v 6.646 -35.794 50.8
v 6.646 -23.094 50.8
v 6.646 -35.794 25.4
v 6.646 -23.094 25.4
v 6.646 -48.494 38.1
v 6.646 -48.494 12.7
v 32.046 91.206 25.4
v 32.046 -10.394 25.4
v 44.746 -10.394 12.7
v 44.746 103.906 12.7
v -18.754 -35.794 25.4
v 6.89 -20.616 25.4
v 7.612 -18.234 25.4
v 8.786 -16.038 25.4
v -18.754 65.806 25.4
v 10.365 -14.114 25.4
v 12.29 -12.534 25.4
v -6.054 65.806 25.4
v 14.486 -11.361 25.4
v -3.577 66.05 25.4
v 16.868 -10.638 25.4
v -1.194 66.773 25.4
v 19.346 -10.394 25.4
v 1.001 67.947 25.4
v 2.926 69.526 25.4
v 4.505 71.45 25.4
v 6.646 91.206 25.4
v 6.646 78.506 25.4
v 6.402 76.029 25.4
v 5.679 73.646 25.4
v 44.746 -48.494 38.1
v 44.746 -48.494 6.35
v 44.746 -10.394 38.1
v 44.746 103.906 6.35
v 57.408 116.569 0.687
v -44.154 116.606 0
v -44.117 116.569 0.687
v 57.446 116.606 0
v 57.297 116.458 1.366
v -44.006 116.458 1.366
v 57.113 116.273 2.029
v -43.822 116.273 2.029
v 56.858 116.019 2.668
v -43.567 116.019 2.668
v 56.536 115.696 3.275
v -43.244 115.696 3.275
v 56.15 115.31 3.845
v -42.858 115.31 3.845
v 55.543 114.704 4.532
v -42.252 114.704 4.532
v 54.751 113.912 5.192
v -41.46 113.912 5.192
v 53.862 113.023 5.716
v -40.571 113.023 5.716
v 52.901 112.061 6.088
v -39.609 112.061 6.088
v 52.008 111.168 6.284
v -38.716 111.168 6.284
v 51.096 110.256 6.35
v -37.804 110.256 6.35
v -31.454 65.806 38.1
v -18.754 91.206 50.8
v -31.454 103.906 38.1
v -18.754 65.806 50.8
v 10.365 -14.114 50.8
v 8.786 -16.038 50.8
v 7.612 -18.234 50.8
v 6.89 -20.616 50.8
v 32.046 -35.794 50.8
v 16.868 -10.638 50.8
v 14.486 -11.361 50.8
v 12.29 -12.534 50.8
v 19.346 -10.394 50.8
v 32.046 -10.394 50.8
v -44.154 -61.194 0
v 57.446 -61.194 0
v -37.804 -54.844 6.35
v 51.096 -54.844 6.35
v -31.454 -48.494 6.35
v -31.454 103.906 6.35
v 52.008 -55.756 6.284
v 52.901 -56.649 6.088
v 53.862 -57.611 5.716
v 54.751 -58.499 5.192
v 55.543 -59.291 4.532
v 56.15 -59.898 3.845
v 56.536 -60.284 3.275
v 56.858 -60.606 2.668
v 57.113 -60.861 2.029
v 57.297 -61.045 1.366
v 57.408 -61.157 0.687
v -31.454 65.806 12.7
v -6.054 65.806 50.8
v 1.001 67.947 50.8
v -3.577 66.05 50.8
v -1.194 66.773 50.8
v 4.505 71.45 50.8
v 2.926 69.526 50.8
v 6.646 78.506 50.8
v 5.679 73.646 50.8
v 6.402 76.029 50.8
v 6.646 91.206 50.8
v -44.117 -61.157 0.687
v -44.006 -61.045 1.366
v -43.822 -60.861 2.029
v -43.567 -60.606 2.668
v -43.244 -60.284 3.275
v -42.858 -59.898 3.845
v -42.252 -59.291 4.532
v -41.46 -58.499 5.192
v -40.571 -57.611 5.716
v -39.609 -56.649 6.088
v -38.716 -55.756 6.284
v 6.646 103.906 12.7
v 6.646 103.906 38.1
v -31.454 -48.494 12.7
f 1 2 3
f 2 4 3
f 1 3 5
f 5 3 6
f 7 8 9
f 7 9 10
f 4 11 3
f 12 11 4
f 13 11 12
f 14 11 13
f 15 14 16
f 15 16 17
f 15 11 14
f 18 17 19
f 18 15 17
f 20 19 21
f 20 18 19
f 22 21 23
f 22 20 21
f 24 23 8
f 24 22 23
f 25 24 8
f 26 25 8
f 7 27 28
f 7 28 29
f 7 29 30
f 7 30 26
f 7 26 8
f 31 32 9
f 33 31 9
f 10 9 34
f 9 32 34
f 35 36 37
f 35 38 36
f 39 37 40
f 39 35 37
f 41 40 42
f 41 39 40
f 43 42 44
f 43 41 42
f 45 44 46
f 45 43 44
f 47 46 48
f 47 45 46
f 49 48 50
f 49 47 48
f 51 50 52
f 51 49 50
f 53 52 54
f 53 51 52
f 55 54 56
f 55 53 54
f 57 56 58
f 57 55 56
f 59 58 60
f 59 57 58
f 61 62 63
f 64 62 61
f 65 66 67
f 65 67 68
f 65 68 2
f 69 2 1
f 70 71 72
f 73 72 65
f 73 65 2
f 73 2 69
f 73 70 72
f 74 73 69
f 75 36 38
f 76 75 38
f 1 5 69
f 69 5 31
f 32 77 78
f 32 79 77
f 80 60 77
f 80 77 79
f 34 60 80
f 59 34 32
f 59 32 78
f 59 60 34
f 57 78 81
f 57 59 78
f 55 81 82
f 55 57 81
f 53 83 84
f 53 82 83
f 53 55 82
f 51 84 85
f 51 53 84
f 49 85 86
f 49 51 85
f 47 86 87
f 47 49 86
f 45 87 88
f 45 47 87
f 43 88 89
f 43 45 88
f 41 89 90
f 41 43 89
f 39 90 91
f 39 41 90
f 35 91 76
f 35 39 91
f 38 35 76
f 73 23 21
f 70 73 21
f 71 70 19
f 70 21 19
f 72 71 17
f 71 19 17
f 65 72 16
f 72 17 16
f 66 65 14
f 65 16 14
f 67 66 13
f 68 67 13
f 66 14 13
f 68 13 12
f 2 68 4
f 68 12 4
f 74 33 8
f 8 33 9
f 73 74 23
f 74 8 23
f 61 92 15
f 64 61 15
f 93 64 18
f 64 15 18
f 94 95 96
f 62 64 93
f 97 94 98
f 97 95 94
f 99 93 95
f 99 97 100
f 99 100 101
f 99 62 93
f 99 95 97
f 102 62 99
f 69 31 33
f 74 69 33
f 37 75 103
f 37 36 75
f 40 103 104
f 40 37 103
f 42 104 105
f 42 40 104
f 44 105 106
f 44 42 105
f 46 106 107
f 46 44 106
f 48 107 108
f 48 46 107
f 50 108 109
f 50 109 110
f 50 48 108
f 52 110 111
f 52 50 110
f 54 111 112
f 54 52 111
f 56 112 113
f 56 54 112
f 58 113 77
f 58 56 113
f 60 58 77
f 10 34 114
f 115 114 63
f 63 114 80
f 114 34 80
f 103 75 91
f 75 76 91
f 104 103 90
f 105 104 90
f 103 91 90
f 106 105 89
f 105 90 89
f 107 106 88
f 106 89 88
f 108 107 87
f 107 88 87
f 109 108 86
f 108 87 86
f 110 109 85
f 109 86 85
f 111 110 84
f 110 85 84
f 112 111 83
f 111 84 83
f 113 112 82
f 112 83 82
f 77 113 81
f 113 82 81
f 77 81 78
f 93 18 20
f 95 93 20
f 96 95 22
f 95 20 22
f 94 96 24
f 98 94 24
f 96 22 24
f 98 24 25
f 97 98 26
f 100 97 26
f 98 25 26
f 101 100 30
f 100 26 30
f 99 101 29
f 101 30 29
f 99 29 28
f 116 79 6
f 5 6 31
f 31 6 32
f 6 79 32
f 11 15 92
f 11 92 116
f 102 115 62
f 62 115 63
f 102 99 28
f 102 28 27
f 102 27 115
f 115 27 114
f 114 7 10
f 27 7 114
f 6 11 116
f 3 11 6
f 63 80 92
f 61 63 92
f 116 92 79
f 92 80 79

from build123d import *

# Parameters (mm, degrees)
F1_DEPTH = 25.4
F2_DEPTH = 50.8
F0_W     = 101.6
F0_H     = 177.8
F3_DEPTH = 6.35
F4_R     = 6.34999
F5_SIZE  = 12.7
F6_SIZE  = 12.7


# Not quite as in the source:
# - a fillet or chamfer is up to 0.001 mm smaller than in the source, because OpenCascade refuses the exact size
# - a length typed as a fraction of an inch, garbled in the dataset ("3 / 203.2 mm" for 3/8 in), is restored


with BuildPart() as f1:
    # F0 (on Top) → F1 (new body)
    with BuildSketch(Plane.XY):
        with BuildLine():
            Line((44.7456893295, 103.9061718148), (6.6456893295, 103.9061718148))
            Line((6.6456893295, 103.9061718148), (6.6456893295, 78.5061718148))
            ThreePointArc((6.6456893295, 78.5061718148), (2.9259454506, 69.5259156938), (-6.0543106705, 65.8061718148))
            Line((-6.0543106705, 65.8061718148), (-31.4543106705, 65.8061718148))
            Line((-31.4543106705, 65.8061718148), (-31.4543106705, -48.4938281852))
            Line((-31.4543106705, -48.4938281852), (6.6456893295, -48.4938281852))
            Line((6.6456893295, -48.4938281852), (6.6456893295, -23.0938281852))
            ThreePointArc((6.6456893295, -23.0938281852), (10.3654332084, -14.1135720641), (19.3456893295, -10.3938281852))
            Line((19.3456893295, -10.3938281852), (44.7456893295, -10.3938281852))
            Line((44.7456893295, -10.3938281852), (44.7456893295, 103.9061718148))
        make_face()
    extrude(amount=F1_DEPTH)

    # F0 (on Top) → F2 (join)
    with BuildSketch(Plane.XY):
        with BuildLine():
            Line((6.6456893295, 103.9061718148), (-31.4543106705, 103.9061718148))
            Line((-31.4543106705, 103.9061718148), (-31.4543106705, 65.8061718148))
            Line((-31.4543106705, 65.8061718148), (-6.0543106705, 65.8061718148))
            ThreePointArc((-6.0543106705, 65.8061718148), (2.9259454506, 69.5259156938), (6.6456893295, 78.5061718148))
            Line((6.6456893295, 78.5061718148), (6.6456893295, 103.9061718148))
        make_face()
        with BuildLine():
            Line((44.7456893295, -48.4938281852), (44.7456893295, -10.3938281852))
            Line((44.7456893295, -10.3938281852), (19.3456893295, -10.3938281852))
            ThreePointArc((19.3456893295, -10.3938281852), (10.3654332084, -14.1135720641), (6.6456893295, -23.0938281852))
            Line((6.6456893295, -23.0938281852), (6.6456893295, -48.4938281852))
            Line((6.6456893295, -48.4938281852), (44.7456893295, -48.4938281852))
        make_face()
    extrude(amount=F2_DEPTH)

    # F0 (on Top) → F3 (join)
    with BuildSketch(Plane.XY):
        with Locations((6.6456893295, 27.7061718148)):
            Rectangle(F0_W, F0_H)
        Polygon((-31.4543106705, 65.8061718148), (-31.4543106705, 103.9061718148), (6.6456893295, 103.9061718148), (44.7456893295, 103.9061718148), (44.7456893295, -10.3938281852), (44.7456893295, -48.4938281852), (6.6456893295, -48.4938281852), (-31.4543106705, -48.4938281852), align=None, mode=Mode.SUBTRACT)
    extrude(amount=F3_DEPTH)

    # F4 (radius 6.35 in the source; OpenCascade refuses exactly that, so slightly less here)
    f4_edges = [f1.edges().sort_by_distance(p)[0] for p in [
        (6.645689, -61.193828, 6.35),
        (-44.154311, 27.706172, 6.35),
        (6.645689, 116.606172, 6.35),
        (57.445689, 27.706172, 6.35),
    ]]
    fillet(f4_edges, radius=F4_R)

    # F5
    f5_edges = [f1.edges().sort_by_distance(p)[0] for p in [
        (-12.404311, -48.493828, 25.4),
        (-31.454311, 8.656172, 25.4),
        (44.745689, 46.756172, 25.4),
        (25.695689, 103.906172, 25.4),
    ]]
    chamfer(f5_edges, length=F5_SIZE)

    # F6
    f6_edges = [f1.edges().sort_by_distance(p)[0] for p in [
        (44.745689, -29.443828, 50.8),
        (25.695689, -48.493828, 50.8),
        (-31.454311, 84.856172, 50.8),
        (-12.404311, 103.906172, 50.8),
    ]]
    chamfer(f6_edges, length=F6_SIZE)


solid = f1.part
